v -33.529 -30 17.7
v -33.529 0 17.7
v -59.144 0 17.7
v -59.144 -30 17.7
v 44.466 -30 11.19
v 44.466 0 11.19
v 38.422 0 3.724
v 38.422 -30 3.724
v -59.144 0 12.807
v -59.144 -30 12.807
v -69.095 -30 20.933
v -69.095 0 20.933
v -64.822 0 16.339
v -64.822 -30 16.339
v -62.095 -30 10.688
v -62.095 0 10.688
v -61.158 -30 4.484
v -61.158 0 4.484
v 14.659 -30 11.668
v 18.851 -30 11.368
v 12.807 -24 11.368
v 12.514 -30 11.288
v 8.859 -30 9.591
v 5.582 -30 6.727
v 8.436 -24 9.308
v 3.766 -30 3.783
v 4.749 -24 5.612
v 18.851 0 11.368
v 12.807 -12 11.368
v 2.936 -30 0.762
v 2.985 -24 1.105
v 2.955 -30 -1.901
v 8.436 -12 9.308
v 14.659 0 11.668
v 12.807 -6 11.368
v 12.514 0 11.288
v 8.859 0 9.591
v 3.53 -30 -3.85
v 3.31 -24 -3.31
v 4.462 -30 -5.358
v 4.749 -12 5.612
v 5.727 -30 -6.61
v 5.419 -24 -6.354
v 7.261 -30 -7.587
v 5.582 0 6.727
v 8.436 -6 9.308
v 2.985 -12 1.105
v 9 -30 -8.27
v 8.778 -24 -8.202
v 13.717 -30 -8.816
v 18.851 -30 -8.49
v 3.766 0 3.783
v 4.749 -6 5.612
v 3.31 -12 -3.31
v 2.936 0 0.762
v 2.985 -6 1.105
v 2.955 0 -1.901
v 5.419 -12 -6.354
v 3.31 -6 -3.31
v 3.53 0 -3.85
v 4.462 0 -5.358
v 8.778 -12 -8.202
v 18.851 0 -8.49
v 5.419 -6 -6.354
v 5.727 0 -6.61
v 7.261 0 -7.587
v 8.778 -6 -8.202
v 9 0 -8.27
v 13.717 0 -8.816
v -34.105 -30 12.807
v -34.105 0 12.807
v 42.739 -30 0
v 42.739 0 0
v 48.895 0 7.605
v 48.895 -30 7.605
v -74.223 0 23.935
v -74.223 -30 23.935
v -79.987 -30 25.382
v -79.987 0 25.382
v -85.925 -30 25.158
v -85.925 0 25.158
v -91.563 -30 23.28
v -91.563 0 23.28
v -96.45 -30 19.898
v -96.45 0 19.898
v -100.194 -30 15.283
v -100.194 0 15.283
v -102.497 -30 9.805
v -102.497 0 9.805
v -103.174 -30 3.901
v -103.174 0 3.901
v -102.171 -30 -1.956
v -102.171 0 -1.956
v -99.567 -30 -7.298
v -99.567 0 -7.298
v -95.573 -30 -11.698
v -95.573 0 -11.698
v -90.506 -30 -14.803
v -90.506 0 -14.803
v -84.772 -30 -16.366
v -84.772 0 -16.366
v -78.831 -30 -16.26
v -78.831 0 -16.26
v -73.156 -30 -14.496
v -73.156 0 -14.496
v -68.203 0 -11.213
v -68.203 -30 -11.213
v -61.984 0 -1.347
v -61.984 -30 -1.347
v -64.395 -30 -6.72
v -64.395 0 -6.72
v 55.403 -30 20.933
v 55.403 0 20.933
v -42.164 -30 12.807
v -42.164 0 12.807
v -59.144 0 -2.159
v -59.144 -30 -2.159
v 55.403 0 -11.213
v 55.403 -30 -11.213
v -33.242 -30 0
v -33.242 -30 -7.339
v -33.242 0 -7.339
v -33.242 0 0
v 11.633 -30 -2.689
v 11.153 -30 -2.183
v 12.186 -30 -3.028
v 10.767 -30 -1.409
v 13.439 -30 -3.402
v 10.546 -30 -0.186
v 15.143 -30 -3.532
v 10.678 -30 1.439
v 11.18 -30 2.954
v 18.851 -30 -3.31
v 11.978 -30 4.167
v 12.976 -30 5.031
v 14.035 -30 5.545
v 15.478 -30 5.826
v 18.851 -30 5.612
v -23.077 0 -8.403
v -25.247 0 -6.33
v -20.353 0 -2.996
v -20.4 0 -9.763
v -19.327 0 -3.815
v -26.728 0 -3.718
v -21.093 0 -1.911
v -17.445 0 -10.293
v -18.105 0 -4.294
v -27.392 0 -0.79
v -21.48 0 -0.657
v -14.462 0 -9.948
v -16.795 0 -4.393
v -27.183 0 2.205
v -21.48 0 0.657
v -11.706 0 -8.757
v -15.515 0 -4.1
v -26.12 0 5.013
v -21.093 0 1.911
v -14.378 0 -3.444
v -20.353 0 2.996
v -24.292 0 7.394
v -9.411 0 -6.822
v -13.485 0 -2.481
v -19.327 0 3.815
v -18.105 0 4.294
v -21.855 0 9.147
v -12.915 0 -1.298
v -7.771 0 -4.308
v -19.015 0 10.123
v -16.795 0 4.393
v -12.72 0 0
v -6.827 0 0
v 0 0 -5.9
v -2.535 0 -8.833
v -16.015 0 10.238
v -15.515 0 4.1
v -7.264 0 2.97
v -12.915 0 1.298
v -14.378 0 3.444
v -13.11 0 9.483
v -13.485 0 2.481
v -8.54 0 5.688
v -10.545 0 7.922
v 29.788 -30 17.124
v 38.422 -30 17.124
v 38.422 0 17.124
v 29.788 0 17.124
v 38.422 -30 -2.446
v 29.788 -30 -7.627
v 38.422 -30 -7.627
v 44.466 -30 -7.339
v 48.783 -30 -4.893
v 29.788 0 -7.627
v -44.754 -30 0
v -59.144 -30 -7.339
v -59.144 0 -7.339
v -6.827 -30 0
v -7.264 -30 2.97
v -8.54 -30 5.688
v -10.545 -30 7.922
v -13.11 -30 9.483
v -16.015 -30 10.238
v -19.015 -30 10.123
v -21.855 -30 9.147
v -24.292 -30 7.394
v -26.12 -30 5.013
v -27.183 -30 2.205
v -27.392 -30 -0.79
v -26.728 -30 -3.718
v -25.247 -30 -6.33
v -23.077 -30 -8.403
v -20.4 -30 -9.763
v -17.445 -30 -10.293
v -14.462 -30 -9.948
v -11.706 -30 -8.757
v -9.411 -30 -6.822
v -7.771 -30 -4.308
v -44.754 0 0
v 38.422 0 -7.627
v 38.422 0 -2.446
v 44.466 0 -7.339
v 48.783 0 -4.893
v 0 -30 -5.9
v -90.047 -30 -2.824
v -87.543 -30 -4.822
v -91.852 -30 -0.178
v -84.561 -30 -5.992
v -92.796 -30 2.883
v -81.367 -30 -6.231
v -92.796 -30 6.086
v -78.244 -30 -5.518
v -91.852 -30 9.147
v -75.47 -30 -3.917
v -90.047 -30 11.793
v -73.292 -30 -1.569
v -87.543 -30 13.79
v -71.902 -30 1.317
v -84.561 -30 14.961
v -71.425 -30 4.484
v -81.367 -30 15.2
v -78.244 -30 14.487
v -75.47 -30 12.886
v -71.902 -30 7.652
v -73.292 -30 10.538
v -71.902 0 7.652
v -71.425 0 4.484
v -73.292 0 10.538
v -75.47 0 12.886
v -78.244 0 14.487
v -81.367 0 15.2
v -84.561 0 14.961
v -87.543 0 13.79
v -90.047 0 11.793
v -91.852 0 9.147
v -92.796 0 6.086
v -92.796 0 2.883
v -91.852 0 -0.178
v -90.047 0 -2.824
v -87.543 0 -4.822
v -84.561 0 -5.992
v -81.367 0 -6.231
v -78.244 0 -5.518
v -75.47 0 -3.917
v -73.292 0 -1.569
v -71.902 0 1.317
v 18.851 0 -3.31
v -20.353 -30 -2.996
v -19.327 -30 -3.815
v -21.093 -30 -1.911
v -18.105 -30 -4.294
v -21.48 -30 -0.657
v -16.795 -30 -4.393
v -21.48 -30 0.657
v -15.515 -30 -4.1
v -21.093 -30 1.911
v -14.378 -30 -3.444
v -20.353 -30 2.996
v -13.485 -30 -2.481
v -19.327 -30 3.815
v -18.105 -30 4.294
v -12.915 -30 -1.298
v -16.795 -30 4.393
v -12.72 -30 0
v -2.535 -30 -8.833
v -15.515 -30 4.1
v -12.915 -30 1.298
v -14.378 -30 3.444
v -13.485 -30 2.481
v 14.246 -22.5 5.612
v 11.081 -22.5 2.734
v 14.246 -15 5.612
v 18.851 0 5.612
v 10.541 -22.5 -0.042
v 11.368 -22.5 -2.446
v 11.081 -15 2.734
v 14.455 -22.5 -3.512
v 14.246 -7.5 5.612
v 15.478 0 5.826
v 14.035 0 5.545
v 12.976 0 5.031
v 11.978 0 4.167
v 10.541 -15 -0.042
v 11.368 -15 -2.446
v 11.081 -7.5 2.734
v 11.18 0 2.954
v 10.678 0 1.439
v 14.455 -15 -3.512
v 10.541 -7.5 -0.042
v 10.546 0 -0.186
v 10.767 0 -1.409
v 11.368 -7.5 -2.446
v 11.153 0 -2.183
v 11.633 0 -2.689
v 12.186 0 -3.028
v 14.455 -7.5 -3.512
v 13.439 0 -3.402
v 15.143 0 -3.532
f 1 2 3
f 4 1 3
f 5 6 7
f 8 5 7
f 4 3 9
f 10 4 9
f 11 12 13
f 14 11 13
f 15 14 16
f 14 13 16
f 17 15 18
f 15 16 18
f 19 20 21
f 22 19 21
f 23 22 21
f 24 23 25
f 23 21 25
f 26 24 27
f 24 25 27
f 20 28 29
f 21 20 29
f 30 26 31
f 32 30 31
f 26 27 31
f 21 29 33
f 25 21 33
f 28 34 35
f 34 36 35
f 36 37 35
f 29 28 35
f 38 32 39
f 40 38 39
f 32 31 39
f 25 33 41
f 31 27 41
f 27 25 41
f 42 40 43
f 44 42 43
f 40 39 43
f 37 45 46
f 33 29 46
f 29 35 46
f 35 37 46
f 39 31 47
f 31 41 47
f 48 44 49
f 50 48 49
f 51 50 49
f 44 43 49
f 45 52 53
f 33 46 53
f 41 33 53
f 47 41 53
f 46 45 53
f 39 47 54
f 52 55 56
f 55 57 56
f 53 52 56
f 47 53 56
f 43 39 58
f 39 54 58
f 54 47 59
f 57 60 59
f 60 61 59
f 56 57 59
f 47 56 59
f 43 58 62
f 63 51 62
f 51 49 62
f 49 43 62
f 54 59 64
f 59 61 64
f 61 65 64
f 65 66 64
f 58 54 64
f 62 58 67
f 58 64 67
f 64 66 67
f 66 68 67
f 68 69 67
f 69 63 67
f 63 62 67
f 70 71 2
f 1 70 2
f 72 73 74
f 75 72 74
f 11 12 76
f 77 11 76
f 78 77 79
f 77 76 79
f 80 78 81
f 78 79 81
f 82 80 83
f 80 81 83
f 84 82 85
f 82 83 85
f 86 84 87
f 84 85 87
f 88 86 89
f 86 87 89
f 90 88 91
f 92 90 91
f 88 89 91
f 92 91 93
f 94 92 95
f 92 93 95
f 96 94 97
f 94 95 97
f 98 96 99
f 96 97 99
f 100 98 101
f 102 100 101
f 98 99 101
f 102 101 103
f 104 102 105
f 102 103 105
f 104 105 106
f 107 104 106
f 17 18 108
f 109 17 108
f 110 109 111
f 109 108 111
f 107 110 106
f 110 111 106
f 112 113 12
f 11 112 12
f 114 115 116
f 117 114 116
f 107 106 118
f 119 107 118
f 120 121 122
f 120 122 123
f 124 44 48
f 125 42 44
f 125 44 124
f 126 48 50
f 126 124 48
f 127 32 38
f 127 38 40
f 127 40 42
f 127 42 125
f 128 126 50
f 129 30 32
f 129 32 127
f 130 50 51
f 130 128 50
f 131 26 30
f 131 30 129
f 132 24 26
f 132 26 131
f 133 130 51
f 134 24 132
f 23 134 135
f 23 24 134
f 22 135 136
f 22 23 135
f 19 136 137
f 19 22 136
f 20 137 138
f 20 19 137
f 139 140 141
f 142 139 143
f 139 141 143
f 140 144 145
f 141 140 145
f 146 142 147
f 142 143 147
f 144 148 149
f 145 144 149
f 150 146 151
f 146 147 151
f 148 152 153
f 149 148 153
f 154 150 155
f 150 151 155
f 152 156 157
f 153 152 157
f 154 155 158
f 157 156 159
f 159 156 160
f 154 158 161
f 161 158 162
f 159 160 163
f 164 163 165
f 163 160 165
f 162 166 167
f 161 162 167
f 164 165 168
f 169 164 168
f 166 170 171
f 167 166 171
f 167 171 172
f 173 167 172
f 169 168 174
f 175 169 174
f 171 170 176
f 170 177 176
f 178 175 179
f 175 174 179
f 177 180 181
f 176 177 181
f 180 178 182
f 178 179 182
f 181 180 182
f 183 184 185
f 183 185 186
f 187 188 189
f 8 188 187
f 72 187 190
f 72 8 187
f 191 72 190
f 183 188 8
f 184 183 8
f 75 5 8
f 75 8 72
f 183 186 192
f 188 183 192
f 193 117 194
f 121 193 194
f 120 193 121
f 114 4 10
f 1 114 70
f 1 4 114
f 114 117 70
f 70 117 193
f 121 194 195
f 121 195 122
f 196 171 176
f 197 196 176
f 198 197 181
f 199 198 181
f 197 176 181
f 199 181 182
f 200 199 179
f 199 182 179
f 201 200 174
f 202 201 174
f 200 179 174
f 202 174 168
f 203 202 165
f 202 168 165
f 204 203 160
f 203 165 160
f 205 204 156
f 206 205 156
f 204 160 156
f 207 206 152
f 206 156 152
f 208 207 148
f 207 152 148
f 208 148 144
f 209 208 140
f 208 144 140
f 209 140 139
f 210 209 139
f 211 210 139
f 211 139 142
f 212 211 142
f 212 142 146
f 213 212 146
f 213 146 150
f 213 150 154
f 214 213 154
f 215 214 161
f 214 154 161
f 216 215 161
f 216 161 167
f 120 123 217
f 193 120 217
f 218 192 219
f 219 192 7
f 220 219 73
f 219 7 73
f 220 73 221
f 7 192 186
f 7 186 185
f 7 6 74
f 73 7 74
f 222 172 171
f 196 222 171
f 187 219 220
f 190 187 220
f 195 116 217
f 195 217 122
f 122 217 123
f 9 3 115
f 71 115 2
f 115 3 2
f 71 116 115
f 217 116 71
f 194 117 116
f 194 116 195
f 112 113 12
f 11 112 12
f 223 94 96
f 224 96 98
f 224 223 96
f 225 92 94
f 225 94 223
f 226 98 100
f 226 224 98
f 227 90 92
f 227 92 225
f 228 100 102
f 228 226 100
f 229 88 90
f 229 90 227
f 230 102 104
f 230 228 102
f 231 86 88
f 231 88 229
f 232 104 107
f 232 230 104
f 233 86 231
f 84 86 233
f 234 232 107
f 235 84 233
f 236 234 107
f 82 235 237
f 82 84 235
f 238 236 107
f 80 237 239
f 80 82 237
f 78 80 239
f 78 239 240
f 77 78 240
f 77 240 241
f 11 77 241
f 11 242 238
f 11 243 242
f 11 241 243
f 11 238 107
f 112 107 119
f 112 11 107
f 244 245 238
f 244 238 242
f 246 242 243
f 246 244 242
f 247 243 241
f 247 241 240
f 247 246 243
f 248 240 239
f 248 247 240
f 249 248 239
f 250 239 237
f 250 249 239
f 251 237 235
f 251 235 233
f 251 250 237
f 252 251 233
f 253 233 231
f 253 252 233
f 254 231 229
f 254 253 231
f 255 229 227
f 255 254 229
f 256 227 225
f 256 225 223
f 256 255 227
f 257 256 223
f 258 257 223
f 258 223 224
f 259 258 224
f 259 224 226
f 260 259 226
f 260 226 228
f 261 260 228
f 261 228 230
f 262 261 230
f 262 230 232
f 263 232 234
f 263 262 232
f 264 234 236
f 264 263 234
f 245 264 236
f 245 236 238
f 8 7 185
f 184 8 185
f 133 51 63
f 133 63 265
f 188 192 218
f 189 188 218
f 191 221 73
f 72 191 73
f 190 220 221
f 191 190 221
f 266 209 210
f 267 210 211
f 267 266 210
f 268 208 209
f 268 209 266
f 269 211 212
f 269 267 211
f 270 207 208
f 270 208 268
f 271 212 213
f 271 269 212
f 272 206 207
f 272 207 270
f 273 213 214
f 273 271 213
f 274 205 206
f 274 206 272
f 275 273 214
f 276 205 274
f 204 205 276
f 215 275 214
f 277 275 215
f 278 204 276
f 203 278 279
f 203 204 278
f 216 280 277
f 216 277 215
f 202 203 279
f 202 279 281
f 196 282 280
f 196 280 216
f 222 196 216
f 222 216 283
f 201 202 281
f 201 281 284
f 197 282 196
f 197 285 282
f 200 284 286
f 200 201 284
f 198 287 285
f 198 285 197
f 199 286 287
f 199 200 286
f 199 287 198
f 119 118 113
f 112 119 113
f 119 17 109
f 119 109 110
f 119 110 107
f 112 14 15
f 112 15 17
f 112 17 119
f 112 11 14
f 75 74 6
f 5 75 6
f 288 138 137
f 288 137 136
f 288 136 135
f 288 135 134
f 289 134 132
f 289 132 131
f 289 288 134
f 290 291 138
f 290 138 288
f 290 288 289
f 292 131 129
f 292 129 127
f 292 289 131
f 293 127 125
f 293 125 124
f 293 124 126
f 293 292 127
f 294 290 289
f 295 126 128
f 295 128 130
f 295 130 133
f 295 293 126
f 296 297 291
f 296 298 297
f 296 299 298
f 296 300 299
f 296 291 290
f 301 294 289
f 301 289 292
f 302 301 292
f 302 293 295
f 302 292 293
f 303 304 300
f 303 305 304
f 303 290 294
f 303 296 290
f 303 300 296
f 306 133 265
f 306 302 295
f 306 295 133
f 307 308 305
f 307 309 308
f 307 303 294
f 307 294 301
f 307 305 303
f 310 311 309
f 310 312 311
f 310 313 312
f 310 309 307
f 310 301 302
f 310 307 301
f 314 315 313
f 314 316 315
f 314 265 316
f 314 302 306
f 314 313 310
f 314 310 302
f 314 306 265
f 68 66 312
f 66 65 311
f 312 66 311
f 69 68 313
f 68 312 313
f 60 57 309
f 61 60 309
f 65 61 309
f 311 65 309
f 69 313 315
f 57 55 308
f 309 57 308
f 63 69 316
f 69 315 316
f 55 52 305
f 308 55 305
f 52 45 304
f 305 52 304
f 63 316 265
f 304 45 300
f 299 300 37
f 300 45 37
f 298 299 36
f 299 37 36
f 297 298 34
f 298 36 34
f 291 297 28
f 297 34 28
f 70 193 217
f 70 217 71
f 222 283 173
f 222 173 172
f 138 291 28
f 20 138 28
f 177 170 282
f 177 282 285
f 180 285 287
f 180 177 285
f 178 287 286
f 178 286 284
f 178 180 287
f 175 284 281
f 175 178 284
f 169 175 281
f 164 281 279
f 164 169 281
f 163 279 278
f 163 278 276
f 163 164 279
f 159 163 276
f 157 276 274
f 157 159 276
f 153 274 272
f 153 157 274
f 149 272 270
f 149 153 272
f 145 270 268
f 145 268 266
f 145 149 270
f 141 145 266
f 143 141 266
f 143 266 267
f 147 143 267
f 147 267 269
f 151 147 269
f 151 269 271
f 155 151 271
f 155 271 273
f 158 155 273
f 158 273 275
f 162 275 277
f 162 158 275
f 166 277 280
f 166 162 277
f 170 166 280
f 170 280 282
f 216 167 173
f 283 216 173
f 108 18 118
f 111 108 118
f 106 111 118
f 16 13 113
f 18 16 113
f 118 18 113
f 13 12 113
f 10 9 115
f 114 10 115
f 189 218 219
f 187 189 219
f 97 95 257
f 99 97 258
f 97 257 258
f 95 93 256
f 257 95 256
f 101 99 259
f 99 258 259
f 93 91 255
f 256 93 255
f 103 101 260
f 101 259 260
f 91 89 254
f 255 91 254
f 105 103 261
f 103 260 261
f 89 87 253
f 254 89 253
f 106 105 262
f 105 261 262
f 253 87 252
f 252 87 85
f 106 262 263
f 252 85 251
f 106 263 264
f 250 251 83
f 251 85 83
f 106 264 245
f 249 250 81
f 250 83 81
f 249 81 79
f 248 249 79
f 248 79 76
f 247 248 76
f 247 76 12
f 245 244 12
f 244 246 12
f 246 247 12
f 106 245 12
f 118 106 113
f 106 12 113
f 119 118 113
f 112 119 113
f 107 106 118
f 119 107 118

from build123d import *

# Parameters (mm, degrees)
F2_DEPTH = 30
F1_R     = 4.4049320067
F0_R     = 10.7456012025
F3_DEPTH = 30


with BuildPart() as f2:
    # F1 (on face) → F2 (new body)
    with BuildSketch(Plane.XZ):
        Polygon((-33.5293710232, 17.7000537515), (-59.1440834105, 17.7000537515), (-59.1440834105, 12.8073561937), (-42.1635434031, 12.8073561937), (-59.1440834105, -2.158543095), (-59.1440834105, -7.3390468024), (-33.2415662706, -7.3390468024), (-33.2415662706, 0), (-44.7537973523, 0), (-34.1049805284, 12.8073561937), align=None)
    extrude(amount=F2_DEPTH)


with BuildPart() as f2b:
    # F1 (on face) → F2, piece 2 (new body)
    with BuildSketch(Plane.XZ):
        with BuildLine():
            ThreePointArc((-7.7708927198, -4.3077798834), (-7.0654321008, -2.2050330991), (-6.8265853814, 0))
            ThreePointArc((-6.8265853814, 0), (-27.1834526665, 2.2050330991), (-7.7708927198, -4.3077798834))
        make_face()
        with Locations((-17.1244423836, 0)):
            Circle(F1_R, mode=Mode.SUBTRACT)
        with BuildLine():
            Line((0, -5.9000179172), (-6.8265853814, 0))
            ThreePointArc((-6.8265853814, 0), (-7.0654321008, -2.2050330991), (-7.7708927198, -4.3077798834))
            Line((-7.7708927198, -4.3077798834), (-2.5349416562, -8.8330591208))
            Line((-2.5349416562, -8.8330591208), (0, -5.9000179172))
        make_face()
    extrude(amount=F2_DEPTH)


with BuildPart() as f2c:
    # F1 (on face) → F2, piece 3 (new body)
    with BuildSketch(Plane.XZ):
        with BuildLine():
            Line((18.8512783498, 5.6122122332), (18.8512783498, 11.3683268428))
            add(Edge.make_bspline(
                [(18.8512783498, 11.3683268428), (16.934619478, 11.6522354863), (12.5645344654, 12.2995624187), (3.503068807, 6.4915593774), (1.8527053529, -3.8045495423), (8.6995157805, -9.4087929989), (15.2933857079, -8.8121851572), (18.8512783498, -8.4902700037)],
                knots=[0, 0, 0, 0, 0.1696075799, 0.3867143778, 0.5941124684, 0.7809929104, 1, 1, 1, 1], degree=3))
            Line((18.8512783498, -8.4902700037), (18.8512783498, -3.3097660635))
            add(Edge.make_bspline(
                [(18.8512783498, 5.6122122332), (17.2492587339, 5.8171733652), (14.1030304305, 6.2196993442), (10.4515493069, 3.186391092), (10.1457232334, -4.0887450053), (15.7750482612, -3.5850292061), (18.8512783498, -3.3097660635)],
                knots=[0, 0, 0, 0, 0.2323221255, 0.4562606098, 0.7028653588, 1, 1, 1, 1], degree=3))
        make_face()
    extrude(amount=F2_DEPTH)


with BuildPart() as f2d:
    # F1 (on face) → F2, piece 4 (new body)
    with BuildSketch(Plane.XZ):
        Polygon((38.4220704436, 17.1244423836), (29.7878943384, 17.1244423836), (29.7878943384, -7.6268524863), (38.4220704436, -7.6268524863), (38.4220704436, -2.4463490117), (44.4659888744, -7.3390468024), (48.7830750644, -4.8926979071), (42.7391564898, 0), (48.8952434361, 7.6045750113), (44.4659888744, 11.1901634431), (38.4220704436, 3.7241494849), align=None)
    extrude(amount=F2_DEPTH)


with BuildPart() as f2e:
    # F0 (on Front) → F2, piece 5 (new body)
    with BuildSketch(Plane.XZ):
        with BuildLine():
            ThreePointArc((-69.0952130065, 20.9325148778), (-63.2463155324, 13.6158451119), (-61.1583623106, 4.4843770224))
            ThreePointArc((-61.1583623106, 4.4843770224), (-63.0001614839, -4.1183412047), (-68.2026712705, -11.2129079295))
            Line((-68.2026712705, -11.2129079295), (55.4026070849, -11.2129079295))
            Line((55.4026070849, -11.2129079295), (55.4026070849, 20.9325148778))
            Line((55.4026070849, 20.9325148778), (-69.0952130065, 20.9325148778))
        make_face()
    extrude(amount=F2_DEPTH)


with BuildPart() as f3:
    # F0 (on Front) → F3 (new body)
    with BuildSketch(Plane.XZ):
        with BuildLine():
            ThreePointArc((-68.2026712705, -11.2129079295), (-63.0001614839, -4.1183412047), (-61.1583623106, 4.4843770224))
            ThreePointArc((-61.1583623106, 4.4843770224), (-63.2463155324, 13.6158451119), (-69.0952130065, 20.9325148778))
            ThreePointArc((-69.0952130065, 20.9325148778), (-103.1738422822, 3.901193768), (-68.2026712705, -11.2129079295))
        make_face()
        with Locations((-82.1701496464, 4.4843770224)):
            Circle(F0_R, mode=Mode.SUBTRACT)
        with BuildLine():
            ThreePointArc((-69.0952130065, 20.9325148778), (-63.2463155324, 13.6158451119), (-61.1583623106, 4.4843770224))
            ThreePointArc((-61.1583623106, 4.4843770224), (-63.0001614839, -4.1183412047), (-68.2026712705, -11.2129079295))
            Line((-68.2026712705, -11.2129079295), (55.4026070849, -11.2129079295))
            Line((55.4026070849, -11.2129079295), (55.4026070849, 20.9325148778))
            Line((55.4026070849, 20.9325148778), (-69.0952130065, 20.9325148778))
        make_face()
    extrude(amount=F3_DEPTH)


solid = Compound([f2.part, f2b.part, f2c.part, f2d.part, f2e.part, f3.part])
